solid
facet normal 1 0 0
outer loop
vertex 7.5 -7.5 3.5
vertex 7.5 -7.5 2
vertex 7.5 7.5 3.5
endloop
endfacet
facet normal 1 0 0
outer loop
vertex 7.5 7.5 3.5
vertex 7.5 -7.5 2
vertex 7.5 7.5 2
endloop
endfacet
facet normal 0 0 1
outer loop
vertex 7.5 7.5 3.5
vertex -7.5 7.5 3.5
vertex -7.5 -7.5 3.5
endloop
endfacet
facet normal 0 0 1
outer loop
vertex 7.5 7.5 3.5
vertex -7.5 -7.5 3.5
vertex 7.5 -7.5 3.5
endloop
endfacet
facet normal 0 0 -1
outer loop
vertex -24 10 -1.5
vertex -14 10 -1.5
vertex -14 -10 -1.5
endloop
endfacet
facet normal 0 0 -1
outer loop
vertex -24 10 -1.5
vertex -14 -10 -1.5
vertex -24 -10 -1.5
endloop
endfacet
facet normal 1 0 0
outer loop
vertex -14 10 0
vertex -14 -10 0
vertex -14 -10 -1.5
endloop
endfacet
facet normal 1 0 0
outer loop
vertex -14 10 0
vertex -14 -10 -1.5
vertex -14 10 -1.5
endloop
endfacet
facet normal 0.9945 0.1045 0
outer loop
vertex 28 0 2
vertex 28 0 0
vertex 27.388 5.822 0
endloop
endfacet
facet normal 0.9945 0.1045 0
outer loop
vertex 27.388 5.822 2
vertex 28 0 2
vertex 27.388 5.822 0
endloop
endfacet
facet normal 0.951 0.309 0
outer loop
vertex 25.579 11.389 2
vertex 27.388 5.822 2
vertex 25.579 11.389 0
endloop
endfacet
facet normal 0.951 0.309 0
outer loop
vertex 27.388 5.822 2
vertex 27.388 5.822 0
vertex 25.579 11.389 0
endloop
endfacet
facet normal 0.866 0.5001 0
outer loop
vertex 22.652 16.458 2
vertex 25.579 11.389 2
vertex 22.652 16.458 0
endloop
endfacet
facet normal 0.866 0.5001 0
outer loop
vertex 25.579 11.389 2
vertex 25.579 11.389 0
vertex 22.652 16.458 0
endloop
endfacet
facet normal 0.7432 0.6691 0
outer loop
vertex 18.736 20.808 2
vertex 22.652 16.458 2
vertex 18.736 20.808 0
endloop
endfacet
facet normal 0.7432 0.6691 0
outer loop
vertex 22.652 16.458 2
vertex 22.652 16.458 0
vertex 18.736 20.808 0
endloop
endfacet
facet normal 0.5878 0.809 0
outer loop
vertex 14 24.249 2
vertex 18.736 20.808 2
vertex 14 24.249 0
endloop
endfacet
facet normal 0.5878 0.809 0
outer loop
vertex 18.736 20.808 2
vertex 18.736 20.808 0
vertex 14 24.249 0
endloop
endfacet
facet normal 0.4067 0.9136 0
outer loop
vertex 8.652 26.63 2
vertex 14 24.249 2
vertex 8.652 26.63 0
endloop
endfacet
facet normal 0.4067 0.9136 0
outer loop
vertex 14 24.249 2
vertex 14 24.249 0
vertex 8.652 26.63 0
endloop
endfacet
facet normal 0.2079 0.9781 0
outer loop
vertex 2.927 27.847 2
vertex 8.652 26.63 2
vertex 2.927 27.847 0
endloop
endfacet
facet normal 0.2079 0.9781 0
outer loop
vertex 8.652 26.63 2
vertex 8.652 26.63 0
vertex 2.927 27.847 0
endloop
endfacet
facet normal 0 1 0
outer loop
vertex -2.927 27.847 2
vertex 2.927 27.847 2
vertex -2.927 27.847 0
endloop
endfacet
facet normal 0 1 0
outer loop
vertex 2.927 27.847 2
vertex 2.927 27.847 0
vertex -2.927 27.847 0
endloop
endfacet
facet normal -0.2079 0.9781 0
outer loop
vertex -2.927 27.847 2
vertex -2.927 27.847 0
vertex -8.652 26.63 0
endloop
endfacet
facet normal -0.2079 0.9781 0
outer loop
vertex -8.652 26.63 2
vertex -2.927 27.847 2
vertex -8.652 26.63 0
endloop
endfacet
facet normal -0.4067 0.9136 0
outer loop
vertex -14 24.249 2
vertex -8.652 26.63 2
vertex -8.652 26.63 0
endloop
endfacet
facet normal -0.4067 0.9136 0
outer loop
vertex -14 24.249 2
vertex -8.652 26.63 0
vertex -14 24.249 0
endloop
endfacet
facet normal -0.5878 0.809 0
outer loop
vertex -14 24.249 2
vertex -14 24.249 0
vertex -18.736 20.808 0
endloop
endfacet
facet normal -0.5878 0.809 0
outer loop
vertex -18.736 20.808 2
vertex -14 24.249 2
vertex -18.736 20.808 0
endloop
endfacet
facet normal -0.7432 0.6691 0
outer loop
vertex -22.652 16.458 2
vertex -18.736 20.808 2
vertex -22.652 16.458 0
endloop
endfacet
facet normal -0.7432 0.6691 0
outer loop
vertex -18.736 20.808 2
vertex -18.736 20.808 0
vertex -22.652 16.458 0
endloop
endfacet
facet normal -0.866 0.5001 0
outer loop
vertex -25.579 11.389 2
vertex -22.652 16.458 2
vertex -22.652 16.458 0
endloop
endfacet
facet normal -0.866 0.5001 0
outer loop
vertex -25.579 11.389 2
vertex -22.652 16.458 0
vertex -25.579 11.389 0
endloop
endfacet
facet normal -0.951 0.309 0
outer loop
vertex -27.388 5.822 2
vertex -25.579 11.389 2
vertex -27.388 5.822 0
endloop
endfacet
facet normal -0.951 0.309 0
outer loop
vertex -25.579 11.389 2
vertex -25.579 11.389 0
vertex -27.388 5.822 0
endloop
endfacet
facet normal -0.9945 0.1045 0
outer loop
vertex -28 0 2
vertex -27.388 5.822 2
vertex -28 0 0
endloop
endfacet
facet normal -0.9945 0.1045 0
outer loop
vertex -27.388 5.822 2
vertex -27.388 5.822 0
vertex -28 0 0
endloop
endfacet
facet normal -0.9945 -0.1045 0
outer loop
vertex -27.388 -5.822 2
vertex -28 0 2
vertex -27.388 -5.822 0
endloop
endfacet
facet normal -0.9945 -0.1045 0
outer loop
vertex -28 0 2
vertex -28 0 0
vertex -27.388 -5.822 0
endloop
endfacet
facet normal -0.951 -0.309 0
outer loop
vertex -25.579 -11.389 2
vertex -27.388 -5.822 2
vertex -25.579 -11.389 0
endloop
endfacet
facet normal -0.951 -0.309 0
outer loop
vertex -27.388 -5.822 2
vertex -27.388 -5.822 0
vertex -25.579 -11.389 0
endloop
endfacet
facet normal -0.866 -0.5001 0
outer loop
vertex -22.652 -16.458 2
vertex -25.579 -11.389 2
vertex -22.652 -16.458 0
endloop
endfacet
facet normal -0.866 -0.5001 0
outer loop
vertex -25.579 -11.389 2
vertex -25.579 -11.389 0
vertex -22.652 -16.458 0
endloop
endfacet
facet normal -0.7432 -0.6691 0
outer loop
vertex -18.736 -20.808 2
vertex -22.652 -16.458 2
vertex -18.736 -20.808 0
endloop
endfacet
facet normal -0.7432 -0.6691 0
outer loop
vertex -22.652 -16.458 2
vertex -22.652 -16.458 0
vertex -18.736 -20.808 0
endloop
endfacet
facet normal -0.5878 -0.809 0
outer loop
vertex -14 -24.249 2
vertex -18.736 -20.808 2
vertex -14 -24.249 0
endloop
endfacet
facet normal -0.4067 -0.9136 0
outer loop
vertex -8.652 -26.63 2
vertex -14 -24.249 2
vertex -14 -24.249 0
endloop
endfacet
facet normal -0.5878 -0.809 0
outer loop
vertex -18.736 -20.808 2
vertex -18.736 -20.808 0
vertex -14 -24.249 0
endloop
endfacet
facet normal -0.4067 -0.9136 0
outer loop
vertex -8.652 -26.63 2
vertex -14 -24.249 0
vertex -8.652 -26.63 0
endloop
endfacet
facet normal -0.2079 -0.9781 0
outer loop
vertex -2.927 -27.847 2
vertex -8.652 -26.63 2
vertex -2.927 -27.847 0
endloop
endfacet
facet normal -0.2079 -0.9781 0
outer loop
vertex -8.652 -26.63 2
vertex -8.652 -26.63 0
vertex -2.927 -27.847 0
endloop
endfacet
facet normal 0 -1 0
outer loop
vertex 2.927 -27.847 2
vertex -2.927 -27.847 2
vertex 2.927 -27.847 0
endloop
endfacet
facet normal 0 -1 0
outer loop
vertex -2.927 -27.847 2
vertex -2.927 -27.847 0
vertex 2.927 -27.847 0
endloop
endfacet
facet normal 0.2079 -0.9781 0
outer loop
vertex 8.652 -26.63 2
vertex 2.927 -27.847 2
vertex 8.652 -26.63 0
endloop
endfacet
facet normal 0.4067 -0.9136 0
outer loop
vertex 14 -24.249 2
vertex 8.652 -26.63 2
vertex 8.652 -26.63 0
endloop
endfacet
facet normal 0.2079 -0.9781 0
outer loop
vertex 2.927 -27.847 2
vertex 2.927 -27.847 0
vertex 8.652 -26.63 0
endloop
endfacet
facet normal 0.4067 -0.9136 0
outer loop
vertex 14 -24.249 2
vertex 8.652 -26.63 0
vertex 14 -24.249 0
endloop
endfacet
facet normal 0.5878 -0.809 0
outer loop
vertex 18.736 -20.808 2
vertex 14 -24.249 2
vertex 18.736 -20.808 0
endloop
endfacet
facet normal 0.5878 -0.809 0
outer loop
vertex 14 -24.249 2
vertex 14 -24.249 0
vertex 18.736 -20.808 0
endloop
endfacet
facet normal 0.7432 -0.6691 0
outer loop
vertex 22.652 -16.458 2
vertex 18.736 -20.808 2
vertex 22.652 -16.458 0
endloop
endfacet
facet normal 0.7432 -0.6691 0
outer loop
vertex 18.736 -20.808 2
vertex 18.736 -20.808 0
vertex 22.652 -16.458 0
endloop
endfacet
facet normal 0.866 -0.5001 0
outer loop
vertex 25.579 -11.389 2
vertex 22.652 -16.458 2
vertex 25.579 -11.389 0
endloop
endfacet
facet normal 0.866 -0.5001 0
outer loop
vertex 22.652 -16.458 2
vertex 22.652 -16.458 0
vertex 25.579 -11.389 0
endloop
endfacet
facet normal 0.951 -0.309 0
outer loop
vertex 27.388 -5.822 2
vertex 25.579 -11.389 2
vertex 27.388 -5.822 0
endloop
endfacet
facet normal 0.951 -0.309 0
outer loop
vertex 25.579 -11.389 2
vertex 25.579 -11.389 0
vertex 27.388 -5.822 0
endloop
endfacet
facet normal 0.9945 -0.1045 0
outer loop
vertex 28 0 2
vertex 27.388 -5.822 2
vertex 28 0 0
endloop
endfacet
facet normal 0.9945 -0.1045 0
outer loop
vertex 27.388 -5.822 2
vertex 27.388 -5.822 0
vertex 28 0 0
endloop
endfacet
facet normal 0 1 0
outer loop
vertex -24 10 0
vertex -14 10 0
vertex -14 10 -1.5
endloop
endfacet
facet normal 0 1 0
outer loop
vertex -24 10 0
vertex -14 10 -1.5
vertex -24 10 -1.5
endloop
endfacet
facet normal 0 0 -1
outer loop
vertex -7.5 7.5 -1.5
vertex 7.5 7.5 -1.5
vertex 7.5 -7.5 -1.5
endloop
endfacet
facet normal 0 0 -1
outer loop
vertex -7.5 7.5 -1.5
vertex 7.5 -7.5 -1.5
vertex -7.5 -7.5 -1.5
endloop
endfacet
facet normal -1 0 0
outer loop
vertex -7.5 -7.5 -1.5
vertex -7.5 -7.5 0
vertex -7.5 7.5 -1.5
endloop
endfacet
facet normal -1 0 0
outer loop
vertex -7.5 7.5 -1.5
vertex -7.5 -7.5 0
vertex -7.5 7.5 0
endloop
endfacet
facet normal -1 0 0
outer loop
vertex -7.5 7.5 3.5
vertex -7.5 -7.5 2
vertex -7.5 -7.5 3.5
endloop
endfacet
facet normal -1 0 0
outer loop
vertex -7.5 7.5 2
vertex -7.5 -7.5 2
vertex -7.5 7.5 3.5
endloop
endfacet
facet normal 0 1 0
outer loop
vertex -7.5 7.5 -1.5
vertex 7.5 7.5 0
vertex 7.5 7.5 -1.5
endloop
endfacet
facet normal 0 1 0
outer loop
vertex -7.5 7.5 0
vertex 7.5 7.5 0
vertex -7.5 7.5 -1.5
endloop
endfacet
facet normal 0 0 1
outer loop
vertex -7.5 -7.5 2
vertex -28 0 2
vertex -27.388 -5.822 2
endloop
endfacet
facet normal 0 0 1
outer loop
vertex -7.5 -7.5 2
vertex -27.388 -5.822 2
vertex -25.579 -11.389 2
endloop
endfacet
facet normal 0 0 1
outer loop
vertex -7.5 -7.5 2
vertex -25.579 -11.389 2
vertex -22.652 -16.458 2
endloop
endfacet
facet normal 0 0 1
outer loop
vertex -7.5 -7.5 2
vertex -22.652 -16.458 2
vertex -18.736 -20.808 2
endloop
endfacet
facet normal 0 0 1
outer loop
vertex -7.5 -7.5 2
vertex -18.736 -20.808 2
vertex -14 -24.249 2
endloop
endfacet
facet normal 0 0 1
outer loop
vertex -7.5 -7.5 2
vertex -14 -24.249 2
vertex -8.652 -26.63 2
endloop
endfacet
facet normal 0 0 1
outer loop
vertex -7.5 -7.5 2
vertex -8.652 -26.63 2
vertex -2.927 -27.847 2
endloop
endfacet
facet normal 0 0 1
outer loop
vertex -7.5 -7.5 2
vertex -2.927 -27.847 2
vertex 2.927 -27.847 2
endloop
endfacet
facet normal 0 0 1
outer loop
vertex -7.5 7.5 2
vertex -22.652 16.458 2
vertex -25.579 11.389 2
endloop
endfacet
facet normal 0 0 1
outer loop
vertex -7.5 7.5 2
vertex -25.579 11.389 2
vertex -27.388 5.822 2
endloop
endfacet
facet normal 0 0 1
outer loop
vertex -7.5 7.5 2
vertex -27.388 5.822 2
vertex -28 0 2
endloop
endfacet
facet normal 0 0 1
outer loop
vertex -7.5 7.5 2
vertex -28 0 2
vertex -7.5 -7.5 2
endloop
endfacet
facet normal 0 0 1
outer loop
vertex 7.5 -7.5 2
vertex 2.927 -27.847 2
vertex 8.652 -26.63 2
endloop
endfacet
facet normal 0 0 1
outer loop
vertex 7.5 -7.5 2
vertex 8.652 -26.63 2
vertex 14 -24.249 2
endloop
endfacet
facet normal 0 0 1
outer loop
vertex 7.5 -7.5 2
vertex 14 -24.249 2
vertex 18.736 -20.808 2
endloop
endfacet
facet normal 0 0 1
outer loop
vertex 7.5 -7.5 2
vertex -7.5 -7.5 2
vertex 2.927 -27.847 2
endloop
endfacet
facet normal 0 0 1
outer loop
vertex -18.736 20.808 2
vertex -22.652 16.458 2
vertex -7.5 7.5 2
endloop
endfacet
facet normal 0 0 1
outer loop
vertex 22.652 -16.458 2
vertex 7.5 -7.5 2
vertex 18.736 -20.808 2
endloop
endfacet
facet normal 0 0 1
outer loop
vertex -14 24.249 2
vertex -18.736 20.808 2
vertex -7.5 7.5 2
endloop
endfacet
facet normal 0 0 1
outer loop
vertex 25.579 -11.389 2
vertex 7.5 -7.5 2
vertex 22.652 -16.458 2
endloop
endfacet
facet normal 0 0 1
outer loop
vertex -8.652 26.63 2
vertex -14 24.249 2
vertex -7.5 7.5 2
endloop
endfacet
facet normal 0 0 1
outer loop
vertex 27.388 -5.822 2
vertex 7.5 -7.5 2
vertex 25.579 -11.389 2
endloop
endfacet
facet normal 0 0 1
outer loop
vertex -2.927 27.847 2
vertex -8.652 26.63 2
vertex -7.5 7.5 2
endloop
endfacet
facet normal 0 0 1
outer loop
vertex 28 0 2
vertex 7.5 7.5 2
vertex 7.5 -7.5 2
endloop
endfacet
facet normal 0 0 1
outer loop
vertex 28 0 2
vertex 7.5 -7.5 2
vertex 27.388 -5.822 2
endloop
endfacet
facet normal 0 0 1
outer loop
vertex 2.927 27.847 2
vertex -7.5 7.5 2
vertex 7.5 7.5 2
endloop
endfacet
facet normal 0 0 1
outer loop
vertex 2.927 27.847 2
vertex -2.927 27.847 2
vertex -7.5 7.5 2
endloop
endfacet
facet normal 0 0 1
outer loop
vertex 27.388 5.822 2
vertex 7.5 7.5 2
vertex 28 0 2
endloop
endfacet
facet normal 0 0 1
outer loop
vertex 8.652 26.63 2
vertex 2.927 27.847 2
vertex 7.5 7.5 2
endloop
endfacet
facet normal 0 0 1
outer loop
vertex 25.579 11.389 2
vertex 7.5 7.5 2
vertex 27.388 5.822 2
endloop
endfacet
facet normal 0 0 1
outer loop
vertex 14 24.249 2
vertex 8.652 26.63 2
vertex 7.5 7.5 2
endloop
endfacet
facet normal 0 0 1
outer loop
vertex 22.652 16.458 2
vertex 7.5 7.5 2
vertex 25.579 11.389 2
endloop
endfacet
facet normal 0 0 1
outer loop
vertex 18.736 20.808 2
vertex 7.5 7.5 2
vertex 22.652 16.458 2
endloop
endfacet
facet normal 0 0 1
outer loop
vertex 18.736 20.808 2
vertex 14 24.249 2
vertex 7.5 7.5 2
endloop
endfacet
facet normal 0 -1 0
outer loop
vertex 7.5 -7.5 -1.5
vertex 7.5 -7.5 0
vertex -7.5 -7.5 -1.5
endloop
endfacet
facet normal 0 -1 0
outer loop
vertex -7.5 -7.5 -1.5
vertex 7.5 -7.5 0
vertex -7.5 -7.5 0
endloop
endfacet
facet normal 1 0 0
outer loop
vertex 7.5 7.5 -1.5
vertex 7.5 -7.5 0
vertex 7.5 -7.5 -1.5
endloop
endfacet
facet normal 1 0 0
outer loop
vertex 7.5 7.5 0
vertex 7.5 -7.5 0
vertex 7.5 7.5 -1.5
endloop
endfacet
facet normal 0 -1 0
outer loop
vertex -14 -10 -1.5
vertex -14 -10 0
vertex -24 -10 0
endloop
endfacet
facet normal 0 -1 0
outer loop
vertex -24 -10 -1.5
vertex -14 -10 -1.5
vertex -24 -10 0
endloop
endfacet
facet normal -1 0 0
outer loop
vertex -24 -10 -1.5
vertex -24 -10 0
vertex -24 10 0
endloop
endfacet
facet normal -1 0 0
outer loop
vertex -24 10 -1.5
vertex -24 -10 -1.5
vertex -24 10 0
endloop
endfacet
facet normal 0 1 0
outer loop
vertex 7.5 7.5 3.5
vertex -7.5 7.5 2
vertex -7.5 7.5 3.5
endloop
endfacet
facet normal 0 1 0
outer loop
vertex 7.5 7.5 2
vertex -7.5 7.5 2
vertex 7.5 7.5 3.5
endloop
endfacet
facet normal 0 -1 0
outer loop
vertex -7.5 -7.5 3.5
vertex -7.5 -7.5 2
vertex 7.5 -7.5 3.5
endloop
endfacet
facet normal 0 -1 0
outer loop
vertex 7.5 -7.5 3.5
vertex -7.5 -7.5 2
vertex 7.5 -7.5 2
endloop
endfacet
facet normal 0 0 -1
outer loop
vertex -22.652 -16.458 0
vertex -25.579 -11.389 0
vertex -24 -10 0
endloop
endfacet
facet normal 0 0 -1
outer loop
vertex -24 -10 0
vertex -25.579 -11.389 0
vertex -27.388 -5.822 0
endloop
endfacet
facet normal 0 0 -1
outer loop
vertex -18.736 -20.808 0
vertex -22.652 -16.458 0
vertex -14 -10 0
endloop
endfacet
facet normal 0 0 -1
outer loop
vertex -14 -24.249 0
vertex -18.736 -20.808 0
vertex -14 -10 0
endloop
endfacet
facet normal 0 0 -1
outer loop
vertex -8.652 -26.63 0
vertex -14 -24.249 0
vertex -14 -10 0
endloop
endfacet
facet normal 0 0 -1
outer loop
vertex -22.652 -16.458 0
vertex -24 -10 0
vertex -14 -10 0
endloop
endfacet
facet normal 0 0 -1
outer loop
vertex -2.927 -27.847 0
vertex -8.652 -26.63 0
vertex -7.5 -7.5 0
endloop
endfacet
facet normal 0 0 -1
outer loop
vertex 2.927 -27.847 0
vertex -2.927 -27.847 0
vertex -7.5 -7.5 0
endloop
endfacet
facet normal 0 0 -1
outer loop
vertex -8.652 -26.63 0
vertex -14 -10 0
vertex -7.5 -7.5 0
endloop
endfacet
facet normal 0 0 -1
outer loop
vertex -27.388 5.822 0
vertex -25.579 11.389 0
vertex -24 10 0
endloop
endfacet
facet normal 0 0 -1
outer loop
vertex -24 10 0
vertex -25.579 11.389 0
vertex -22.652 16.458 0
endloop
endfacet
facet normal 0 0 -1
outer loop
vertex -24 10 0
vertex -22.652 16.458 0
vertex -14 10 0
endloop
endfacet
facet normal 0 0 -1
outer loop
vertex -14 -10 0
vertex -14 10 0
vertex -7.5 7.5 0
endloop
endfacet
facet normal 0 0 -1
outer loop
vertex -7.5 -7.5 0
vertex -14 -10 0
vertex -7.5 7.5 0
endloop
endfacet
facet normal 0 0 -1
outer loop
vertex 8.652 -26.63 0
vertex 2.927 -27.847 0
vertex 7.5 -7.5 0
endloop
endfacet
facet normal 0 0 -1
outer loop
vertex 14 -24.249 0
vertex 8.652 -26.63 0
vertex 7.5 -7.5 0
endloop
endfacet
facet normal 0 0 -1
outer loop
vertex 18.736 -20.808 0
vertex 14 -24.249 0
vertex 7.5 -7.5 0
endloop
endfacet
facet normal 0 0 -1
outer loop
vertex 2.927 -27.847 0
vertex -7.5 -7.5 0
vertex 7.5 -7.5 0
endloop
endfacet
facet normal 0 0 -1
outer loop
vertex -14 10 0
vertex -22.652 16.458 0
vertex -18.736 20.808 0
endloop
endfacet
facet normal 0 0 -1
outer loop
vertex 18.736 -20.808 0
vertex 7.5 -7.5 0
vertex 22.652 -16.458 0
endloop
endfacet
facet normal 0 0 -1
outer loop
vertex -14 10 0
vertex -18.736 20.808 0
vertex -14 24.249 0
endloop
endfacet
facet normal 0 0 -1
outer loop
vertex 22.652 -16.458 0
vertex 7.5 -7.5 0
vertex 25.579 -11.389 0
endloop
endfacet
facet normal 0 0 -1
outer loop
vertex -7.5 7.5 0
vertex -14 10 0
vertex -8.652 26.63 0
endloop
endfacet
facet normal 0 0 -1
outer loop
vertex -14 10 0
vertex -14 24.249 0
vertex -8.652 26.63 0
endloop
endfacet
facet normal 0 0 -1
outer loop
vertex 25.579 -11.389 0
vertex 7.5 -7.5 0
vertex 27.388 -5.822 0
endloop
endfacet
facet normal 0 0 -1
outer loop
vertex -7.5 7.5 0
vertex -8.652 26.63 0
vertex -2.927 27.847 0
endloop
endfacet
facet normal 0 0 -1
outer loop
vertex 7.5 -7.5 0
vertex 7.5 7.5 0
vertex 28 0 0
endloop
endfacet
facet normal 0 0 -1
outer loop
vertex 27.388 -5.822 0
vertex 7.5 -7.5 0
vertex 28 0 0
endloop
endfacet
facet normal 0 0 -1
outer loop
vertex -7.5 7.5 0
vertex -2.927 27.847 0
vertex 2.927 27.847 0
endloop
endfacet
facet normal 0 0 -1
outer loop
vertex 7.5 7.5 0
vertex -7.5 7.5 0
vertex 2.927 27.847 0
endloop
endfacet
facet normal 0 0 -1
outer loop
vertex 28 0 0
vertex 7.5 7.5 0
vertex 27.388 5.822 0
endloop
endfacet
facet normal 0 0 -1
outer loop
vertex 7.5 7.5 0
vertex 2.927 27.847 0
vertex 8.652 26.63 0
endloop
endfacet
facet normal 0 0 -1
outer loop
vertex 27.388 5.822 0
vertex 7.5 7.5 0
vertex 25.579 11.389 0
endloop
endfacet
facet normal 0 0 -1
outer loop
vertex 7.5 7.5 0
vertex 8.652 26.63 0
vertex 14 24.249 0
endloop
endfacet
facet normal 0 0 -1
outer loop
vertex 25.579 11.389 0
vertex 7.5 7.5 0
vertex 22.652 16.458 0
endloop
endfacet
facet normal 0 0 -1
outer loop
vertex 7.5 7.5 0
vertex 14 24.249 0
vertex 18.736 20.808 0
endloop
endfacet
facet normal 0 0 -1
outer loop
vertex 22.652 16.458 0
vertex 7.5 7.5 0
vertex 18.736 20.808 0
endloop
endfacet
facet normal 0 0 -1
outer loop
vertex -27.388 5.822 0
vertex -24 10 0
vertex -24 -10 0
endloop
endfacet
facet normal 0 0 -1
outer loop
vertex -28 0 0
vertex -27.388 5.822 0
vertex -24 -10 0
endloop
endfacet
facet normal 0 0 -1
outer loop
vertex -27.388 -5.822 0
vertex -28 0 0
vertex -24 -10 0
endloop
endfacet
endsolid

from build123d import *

# Parameters (mm, degrees)
SKETCH_1_R      = 28
EXTRUDE_1_DEPTH = 2
SKETCH_2_W      = 15
SKETCH_2_H      = 15
EXTRUDE_2_DEPTH = 1.5
SKETCH_4_W      = 10
SKETCH_4_H      = 20
EXTRUDE_3_DEPTH = 1.5
SKETCH_5_W      = 15
SKETCH_5_H      = 15
EXTRUDE_4_DEPTH = 1.5


with BuildPart() as part:
    # 草图1 → 凸台-拉伸1 (new body)
    with BuildSketch(Plane.XY):
        Circle(SKETCH_1_R)
    extrude(amount=EXTRUDE_1_DEPTH)

    # 草图2 → 凸台-拉伸2 (add)
    with BuildSketch(Plane.XY.offset(2)):
        Rectangle(SKETCH_2_W, SKETCH_2_H)
    extrude(amount=EXTRUDE_2_DEPTH)

    # 草图4 → 凸台-拉伸3 (add)
    with BuildSketch(Plane(origin=(0, 0, 0), x_dir=(-1, 0, 0), z_dir=(0, 0, -1))):
        with Locations((19, 0)):
            Rectangle(SKETCH_4_W, SKETCH_4_H)
    extrude(amount=EXTRUDE_3_DEPTH)

    # 草图5 → 凸台-拉伸4 (add)
    with BuildSketch(Plane(origin=(0, 0, 0), x_dir=(-1, 0, 0), z_dir=(0, 0, -1))):
        Rectangle(SKETCH_5_W, SKETCH_5_H)
    extrude(amount=EXTRUDE_4_DEPTH)


solid = part.part
